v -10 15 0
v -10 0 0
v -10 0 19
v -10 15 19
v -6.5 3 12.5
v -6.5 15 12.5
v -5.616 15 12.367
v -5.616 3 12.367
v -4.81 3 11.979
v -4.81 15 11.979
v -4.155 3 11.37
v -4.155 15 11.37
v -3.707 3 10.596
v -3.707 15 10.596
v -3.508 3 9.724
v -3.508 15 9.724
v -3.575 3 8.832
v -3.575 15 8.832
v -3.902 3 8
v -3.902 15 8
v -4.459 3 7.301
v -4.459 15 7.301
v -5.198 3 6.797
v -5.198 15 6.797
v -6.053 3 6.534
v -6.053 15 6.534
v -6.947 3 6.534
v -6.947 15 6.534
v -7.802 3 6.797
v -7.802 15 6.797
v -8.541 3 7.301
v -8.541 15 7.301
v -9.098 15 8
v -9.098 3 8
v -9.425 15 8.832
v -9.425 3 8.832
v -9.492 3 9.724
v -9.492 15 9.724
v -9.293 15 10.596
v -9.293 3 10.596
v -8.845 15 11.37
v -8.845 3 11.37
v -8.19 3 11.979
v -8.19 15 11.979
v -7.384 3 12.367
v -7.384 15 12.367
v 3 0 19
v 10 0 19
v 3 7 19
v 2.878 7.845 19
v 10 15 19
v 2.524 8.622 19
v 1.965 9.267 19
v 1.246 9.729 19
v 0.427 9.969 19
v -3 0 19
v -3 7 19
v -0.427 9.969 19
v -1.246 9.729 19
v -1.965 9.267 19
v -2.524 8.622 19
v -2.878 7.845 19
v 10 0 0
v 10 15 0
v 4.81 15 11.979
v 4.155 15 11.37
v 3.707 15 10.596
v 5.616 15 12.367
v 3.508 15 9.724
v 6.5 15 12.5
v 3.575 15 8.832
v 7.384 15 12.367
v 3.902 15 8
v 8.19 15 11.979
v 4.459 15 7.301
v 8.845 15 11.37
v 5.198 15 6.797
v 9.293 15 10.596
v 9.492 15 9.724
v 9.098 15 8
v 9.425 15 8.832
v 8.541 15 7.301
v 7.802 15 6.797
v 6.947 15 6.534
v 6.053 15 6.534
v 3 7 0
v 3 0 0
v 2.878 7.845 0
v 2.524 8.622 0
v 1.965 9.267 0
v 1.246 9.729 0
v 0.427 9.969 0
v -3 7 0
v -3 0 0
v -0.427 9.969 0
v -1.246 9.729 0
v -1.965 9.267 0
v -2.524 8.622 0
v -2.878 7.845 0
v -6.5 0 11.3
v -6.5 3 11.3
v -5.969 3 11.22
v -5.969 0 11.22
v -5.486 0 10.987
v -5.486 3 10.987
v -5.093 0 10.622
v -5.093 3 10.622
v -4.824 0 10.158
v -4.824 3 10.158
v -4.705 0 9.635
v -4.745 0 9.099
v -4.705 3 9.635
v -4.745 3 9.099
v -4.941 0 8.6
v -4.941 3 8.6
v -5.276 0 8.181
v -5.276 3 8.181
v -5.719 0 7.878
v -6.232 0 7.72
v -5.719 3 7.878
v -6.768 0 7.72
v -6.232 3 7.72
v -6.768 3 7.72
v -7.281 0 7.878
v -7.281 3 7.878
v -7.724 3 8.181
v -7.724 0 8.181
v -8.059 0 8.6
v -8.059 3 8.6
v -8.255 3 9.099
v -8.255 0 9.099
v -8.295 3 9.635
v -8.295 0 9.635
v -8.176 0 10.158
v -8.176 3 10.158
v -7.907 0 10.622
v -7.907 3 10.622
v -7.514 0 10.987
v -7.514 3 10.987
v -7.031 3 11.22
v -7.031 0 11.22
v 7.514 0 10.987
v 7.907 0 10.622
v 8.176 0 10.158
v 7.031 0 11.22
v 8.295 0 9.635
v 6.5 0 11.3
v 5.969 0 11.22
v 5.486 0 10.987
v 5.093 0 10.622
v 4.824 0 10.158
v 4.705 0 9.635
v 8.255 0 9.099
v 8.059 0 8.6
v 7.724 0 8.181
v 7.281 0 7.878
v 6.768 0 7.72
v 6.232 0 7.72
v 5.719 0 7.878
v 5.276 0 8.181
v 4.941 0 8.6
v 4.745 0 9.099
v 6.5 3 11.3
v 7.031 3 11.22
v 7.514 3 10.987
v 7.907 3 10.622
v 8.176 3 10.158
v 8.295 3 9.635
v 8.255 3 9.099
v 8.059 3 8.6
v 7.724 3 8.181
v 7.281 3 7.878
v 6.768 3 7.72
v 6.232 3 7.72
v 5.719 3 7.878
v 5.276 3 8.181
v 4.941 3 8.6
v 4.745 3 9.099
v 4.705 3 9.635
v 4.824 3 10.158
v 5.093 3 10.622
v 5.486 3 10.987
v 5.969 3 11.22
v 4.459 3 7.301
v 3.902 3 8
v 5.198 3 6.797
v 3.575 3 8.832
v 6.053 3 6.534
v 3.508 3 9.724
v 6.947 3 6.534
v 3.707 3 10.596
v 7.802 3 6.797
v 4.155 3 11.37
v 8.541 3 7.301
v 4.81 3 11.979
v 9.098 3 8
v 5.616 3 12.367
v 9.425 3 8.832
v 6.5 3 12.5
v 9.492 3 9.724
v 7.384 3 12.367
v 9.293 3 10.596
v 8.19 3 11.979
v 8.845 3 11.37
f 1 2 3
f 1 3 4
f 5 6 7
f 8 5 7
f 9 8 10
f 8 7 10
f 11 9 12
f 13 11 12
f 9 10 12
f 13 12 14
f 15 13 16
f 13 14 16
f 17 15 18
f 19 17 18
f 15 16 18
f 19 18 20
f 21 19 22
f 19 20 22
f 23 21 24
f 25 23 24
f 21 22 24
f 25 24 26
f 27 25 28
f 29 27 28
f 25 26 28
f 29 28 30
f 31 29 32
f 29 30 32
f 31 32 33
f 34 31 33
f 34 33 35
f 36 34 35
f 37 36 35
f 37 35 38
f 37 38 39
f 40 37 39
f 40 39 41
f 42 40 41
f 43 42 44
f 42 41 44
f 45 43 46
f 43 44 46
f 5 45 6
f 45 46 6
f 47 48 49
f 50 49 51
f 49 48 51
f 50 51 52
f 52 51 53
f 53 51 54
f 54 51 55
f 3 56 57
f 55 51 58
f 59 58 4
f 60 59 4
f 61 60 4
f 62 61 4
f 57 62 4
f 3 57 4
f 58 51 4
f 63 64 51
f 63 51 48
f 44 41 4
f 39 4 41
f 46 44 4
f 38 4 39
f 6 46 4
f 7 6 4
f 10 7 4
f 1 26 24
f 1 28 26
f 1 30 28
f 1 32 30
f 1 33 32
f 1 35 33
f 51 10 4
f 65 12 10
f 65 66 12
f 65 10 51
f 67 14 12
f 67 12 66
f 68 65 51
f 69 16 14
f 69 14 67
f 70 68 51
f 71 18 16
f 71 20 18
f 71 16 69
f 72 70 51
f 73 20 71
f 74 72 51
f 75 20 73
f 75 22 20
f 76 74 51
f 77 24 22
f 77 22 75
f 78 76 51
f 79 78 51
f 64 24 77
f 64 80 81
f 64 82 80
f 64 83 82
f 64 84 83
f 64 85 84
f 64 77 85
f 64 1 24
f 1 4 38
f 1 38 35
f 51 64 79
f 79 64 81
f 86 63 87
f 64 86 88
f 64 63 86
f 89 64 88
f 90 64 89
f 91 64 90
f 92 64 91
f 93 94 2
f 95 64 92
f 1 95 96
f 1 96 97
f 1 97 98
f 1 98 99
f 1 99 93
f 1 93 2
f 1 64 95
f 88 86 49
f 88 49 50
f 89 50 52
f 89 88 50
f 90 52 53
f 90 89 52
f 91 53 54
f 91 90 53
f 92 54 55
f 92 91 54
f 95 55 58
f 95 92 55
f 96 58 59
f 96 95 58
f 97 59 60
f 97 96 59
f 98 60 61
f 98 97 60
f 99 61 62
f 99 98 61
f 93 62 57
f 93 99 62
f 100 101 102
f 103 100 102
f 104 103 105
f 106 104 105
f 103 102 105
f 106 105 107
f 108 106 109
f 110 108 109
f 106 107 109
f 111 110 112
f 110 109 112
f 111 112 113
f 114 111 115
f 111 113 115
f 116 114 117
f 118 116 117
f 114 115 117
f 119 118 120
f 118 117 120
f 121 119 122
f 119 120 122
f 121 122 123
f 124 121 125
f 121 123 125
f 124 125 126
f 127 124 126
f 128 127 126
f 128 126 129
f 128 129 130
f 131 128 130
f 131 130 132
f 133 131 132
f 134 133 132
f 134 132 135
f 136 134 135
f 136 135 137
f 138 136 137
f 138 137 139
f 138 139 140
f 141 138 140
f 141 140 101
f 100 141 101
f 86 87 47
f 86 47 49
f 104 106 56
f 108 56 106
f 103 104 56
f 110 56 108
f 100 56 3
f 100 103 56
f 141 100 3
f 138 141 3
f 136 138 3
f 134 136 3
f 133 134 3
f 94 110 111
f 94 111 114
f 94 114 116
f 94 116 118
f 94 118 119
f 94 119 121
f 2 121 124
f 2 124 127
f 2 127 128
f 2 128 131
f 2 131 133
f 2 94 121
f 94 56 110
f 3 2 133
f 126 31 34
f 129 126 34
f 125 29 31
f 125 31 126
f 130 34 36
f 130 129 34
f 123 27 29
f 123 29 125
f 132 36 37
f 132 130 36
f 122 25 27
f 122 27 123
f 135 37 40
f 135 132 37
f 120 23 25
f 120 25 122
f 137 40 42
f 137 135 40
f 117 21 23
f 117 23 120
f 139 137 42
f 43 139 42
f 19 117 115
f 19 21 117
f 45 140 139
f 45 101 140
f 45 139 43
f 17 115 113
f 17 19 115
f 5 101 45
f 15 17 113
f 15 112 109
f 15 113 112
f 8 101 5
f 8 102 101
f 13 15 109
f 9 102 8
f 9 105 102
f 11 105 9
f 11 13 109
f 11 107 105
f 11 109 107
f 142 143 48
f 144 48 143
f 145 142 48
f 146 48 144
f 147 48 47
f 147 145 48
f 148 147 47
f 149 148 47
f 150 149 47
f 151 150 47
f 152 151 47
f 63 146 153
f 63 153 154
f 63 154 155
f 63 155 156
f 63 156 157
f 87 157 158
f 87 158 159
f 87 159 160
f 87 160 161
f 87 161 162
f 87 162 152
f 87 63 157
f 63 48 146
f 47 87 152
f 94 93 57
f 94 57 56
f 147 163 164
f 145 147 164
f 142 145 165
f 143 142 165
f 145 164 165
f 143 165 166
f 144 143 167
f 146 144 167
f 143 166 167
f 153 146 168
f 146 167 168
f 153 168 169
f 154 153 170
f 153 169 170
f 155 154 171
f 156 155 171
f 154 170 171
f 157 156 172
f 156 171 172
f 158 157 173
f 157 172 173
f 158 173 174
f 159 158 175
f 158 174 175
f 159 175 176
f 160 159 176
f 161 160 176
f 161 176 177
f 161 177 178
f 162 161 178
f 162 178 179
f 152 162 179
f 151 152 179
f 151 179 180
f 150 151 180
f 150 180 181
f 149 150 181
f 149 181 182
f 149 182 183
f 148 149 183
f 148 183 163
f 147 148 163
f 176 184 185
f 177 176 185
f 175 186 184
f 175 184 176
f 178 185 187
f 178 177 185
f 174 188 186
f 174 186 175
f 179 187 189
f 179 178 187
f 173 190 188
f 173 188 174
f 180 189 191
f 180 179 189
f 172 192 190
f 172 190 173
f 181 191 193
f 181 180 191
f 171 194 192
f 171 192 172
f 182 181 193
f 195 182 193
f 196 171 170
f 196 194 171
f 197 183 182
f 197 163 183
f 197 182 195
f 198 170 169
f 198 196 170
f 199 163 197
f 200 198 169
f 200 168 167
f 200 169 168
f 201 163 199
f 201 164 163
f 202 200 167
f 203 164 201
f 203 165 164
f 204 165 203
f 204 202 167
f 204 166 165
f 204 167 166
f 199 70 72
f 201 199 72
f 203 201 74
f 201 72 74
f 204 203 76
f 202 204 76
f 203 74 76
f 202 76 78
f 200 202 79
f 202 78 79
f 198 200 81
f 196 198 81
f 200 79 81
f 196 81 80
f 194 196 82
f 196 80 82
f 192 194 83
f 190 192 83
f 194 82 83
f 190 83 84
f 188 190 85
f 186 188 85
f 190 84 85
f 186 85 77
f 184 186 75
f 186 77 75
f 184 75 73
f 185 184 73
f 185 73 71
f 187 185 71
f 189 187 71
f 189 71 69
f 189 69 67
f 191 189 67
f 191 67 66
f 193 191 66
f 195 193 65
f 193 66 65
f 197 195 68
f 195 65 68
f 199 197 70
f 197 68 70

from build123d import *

# Parameters (mm, degrees)
BOSS_EXTRUDE1_DEPTH = 19
SKETCH2_R           = 1.8
CUT_EXTRUDE1_DEPTH  = 27.191601707
SKETCH2_3_R         = 3
SKETCH2_3_R_2       = 1.8
CUT_EXTRUDE2_DEPTH  = 12


with BuildPart() as part:
    # Sketch1 → Boss-Extrude1 (new body)
    with BuildSketch(Plane.XY):
        with BuildLine():
            Line((-10, 0), (-10, 15))
            Line((-10, 15), (10, 15))
            Line((10, 15), (10, 0))
            Line((10, 0), (3, 0))
            Line((3, 0), (3, 7))
            ThreePointArc((3, 7), (0, 10), (-3, 7))
            Line((-3, 7), (-3, 0))
            Line((-3, 0), (-10, 0))
        make_face()
    extrude(amount=BOSS_EXTRUDE1_DEPTH)

    # Sketch2 → Cut-Extrude1 (cut, through all)
    with BuildSketch(Plane(origin=(0, 15, 0), x_dir=(1, 0, 0), z_dir=(0, 1, 0))):
        with Locations(Location((-6.5, -9.5, 0), (0, 0, 270))):
            Circle(SKETCH2_R)
        with Locations(Location((6.5, -9.5, 0), (0, 0, 270))):
            Circle(SKETCH2_R)
    extrude(amount=-CUT_EXTRUDE1_DEPTH, mode=Mode.SUBTRACT)

    # Sketch2<3> → Cut-Extrude2 (cut)
    # profile 1 of 2: a face of its own
    with BuildSketch(Plane(origin=(0, 15, 0), x_dir=(1, 0, 0), z_dir=(0, 1, 0))):
        with Locations(Location((-6.5, -9.5, 0), (0, 0, 270))):
            Circle(SKETCH2_3_R)
        with Locations(Location((-6.5, -9.5, 0), (0, 0, 270))):
            Circle(SKETCH2_3_R_2, mode=Mode.SUBTRACT)
    # profile 2 of 2: a face of its own
    with BuildSketch(Plane(origin=(0, 15, 0), x_dir=(1, 0, 0), z_dir=(0, 1, 0))):
        with Locations(Location((6.5, -9.5, 0), (0, 0, 270))):
            Circle(SKETCH2_3_R)
        with Locations(Location((6.5, -9.5, 0), (0, 0, 270))):
            Circle(SKETCH2_3_R_2, mode=Mode.SUBTRACT)
    extrude(amount=-CUT_EXTRUDE2_DEPTH, mode=Mode.SUBTRACT)


solid = part.part
